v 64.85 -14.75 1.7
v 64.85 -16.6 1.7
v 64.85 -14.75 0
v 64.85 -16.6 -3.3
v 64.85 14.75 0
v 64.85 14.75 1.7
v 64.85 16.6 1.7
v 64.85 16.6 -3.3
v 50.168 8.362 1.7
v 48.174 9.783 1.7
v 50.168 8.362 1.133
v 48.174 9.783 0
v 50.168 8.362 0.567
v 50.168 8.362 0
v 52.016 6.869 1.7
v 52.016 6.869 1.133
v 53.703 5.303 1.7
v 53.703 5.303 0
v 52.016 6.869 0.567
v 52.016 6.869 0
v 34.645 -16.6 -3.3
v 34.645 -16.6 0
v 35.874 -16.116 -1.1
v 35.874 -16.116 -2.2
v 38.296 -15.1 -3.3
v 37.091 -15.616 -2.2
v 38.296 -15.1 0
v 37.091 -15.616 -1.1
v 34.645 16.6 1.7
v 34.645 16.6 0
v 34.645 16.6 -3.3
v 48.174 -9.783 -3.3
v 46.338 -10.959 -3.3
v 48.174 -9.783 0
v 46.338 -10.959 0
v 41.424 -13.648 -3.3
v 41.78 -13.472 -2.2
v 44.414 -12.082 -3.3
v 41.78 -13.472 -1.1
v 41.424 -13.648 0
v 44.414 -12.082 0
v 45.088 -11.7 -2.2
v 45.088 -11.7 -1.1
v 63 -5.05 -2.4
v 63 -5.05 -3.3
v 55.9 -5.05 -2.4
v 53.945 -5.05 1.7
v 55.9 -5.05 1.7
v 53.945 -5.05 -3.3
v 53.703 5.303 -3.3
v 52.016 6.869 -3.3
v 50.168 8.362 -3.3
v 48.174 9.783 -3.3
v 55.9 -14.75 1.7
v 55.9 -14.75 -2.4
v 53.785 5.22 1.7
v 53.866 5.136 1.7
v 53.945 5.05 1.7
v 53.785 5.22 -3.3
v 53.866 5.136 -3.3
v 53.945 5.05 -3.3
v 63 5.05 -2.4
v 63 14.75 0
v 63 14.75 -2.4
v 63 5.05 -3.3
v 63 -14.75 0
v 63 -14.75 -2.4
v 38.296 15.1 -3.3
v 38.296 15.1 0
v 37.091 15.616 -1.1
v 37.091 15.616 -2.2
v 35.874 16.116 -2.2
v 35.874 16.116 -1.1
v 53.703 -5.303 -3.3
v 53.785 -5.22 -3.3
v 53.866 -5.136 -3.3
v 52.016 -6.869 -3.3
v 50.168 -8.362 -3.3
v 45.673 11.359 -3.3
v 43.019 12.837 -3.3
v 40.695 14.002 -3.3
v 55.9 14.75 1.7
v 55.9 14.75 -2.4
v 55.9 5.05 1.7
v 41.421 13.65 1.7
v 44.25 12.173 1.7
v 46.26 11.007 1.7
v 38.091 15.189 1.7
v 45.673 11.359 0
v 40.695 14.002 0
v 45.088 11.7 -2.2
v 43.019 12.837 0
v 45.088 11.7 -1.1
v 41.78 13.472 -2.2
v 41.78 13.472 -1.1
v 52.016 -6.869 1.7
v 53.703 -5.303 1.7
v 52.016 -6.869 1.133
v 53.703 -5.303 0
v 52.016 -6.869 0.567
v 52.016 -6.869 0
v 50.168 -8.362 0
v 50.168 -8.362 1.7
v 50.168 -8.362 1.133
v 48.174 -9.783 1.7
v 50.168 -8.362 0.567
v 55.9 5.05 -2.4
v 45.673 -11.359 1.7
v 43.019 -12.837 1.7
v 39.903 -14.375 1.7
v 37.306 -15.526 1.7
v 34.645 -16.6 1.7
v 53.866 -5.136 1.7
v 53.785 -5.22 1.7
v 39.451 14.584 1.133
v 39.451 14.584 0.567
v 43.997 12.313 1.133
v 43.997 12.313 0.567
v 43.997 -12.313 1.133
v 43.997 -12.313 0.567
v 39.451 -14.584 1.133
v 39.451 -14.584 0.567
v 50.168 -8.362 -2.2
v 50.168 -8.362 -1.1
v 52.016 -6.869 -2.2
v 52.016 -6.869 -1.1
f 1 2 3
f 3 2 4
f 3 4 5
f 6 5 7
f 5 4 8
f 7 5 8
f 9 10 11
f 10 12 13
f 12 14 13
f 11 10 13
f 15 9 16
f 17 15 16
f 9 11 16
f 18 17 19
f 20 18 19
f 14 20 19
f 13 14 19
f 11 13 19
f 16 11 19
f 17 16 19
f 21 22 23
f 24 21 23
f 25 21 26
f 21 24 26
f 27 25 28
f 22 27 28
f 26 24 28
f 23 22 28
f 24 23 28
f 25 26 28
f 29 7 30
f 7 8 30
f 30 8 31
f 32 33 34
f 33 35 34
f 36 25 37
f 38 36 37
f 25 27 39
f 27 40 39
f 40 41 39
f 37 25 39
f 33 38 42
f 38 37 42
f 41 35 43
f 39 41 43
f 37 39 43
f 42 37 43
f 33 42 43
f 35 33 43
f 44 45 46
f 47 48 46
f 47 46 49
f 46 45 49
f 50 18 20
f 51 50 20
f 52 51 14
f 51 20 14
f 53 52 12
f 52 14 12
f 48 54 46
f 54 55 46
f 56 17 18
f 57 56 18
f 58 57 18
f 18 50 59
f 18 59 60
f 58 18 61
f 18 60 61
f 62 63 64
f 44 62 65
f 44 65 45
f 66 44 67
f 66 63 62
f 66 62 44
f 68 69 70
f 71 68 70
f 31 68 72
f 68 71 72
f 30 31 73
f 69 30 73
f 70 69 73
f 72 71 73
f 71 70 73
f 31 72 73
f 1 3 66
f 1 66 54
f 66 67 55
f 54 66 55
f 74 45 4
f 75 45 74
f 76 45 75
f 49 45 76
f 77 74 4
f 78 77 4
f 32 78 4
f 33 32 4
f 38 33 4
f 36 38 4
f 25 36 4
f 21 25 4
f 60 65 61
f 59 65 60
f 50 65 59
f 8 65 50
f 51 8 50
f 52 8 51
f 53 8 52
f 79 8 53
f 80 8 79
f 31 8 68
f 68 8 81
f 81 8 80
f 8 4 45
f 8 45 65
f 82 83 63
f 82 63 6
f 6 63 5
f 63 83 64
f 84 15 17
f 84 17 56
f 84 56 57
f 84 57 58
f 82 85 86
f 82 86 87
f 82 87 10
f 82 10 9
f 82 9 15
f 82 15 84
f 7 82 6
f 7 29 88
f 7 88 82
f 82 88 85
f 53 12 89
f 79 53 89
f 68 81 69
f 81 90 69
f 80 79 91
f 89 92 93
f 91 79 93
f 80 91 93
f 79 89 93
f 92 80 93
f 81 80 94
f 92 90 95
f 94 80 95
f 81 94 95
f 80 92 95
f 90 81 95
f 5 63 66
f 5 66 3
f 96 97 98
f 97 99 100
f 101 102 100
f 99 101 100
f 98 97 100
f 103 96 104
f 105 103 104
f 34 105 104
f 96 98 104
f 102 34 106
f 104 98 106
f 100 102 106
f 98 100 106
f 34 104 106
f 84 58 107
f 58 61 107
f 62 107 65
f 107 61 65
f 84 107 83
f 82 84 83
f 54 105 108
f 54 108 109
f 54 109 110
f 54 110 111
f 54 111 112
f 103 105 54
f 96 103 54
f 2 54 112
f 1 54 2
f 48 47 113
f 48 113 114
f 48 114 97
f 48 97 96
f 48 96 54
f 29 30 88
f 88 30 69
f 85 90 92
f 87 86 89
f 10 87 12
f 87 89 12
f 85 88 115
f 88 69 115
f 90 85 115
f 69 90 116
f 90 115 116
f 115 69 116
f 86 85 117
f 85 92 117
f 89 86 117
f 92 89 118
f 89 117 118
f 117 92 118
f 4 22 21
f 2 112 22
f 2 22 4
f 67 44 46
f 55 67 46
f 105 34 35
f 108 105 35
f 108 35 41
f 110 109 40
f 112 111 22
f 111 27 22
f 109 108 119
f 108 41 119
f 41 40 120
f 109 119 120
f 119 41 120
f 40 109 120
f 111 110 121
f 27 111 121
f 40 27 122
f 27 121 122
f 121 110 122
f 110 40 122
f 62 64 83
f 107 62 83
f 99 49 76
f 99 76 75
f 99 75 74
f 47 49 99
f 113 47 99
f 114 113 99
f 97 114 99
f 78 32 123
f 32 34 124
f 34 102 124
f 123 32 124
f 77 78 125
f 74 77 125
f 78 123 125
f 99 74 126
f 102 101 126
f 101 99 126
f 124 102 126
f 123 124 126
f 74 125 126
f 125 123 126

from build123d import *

# Parameters (mm, degrees)
BOSS_EXTRUDE1_DEPTH = 3.3
SKETCH2_W           = 7.1
SKETCH2_H           = 9.7
BOSS_EXTRUDE2_DEPTH = 0.9
BOSS_EXTRUDE3_DEPTH = 1.7


with BuildPart() as part:
    # Sketch1 → Boss-Extrude1 (new body)
    with BuildSketch(Plane.XY):
        with BuildLine():
            Line((57.315911484, 16.6), (34.644864201, 16.6))
            add(Edge.make_bspline(
                [(38.29556789, 15.1), (37.098221073, 15.62404419), (35.878697194, 16.123957864), (34.644864201, 16.6)],
                knots=[0.303308677, 0.303308677, 0.303308677, 0.303308677, 0.363483136, 0.363483136, 0.363483136, 0.363483136], degree=3))
            Line((38.29556789, 15.1), (58.028235271, 15.1))
            add(Edge.make_bspline(
                [(58.028235271, 15.1), (57.812878468, 15.594922403), (57.575647456, 16.094915482), (57.315911484, 16.6)],
                knots=[1.426893222, 1.426893222, 1.426893222, 1.426893222, 1.452839647, 1.452839647, 1.452839647, 1.452839647], degree=3))
        make_face()
        with BuildLine():
            Line((64.85, 16.6), (57.315911484, 16.6))
            add(Edge.make_bspline(
                [(58.028235271, 15.1), (57.812878468, 15.594922403), (57.575647456, 16.094915482), (57.315911484, 16.6)],
                knots=[1.426893222, 1.426893222, 1.426893222, 1.426893222, 1.452839647, 1.452839647, 1.452839647, 1.452839647], degree=3))
            Line((58.028235271, 15.1), (63.35, 15.1))
            Line((63.35, 15.1), (63.35, 7.210091206))
            add(Edge.make_bspline(
                [(63.35, 7.210091206), (63.846734552, 7.128818212), (64.346729159, 7.047274139), (64.85, 6.965459519)],
                knots=[2.014857734, 2.014857734, 2.014857734, 2.014857734, 2.022509587, 2.022509587, 2.022509587, 2.022509587], degree=3))
            Line((64.85, 6.965459519), (64.85, 16.6))
        make_face()
        with BuildLine():
            add(Edge.make_bspline(
                [(55.9, -8.449641541), (53.219410431, -8.903431774), (50.645090889, -9.348060462), (48.173910637, -9.783424554)],
                knots=[-0.975271105, -0.975271105, -0.975271105, -0.975271105, -0.931011535, -0.931011535, -0.931011535, -0.931011535], degree=3))
            add(Edge.make_bspline(
                [(48.17391063, -9.783424538), (50.235379211, -8.397456689), (52.10175446, -6.904847258), (53.703300859, -5.303300859)],
                knots=[0.875469321, 0.875469321, 0.875469321, 0.875469321, 1, 1, 1, 1], degree=3))
            add(Edge.make_bspline(
                [(38.29556789, -15.1), (44.330780941, -12.458561206), (49.802551874, -9.204049844), (53.703300859, -5.303300859)],
                knots=[0.696691323, 0.696691323, 0.696691323, 0.696691323, 1, 1, 1, 1], degree=3))
            Line((38.29556789, -15.1), (58.028235271, -15.1))
            add(Edge.make_bspline(
                [(58.028235271, -15.1), (58.079123886, -14.983050292), (58.128791104, -14.866383717), (58.177245249, -14.75)],
                knots=[-0.426893222, -0.426893222, -0.426893222, -0.426893222, -0.420762106, -0.420762106, -0.420762106, -0.420762106], degree=3))
            Line((58.177245249, -14.75), (55.9, -14.75))
            Line((55.9, -14.75), (55.9, -8.449641541))
        make_face()
        with BuildLine():
            add(Edge.make_bspline(
                [(48.17391063, -9.783424538), (50.235379211, -8.397456689), (52.10175446, -6.904847258), (53.703300859, -5.303300859)],
                knots=[0.875469321, 0.875469321, 0.875469321, 0.875469321, 1, 1, 1, 1], degree=3))
            add(Edge.make_bspline(
                [(55.9, -8.449641541), (53.219410431, -8.903431774), (50.645090889, -9.348060462), (48.173910637, -9.783424554)],
                knots=[-0.975271105, -0.975271105, -0.975271105, -0.975271105, -0.931011535, -0.931011535, -0.931011535, -0.931011535], degree=3))
            Line((55.9, -8.449641541), (55.9, -5.05))
            Line((55.9, -5.05), (53.953496898, -5.05))
            add(Edge.make_bspline(
                [(53.703300859, -5.303300859), (53.787433741, -5.219167977), (53.87083579, -5.134734468), (53.953496898, -5.05)],
                knots=[1, 1, 1, 1, 1.00654188, 1.00654188, 1.00654188, 1.00654188], degree=3))
        make_face()
        with BuildLine():
            add(Edge.make_bspline(
                [(53.703300859, 5.303300859), (52.10175446, 6.904847258), (50.235379211, 8.397456689), (48.17391063, 9.783424538)],
                knots=[0, 0, 0, 0, 0.124530679, 0.124530679, 0.124530679, 0.124530679], degree=3))
            add(Edge.make_bspline(
                [(53.953496898, 5.05), (53.87083579, 5.134734468), (53.787433741, 5.219167977), (53.703300859, 5.303300859)],
                knots=[-0.00654188, -0.00654188, -0.00654188, -0.00654188, 0, 0, 0, 0], degree=3))
            Line((53.953496898, 5.05), (55.9, 5.05))
            Line((55.9, 5.05), (55.9, 8.449641541))
            add(Edge.make_bspline(
                [(48.173910637, 9.783424554), (50.645090889, 9.348060462), (53.219410431, 8.903431774), (55.9, 8.449641541)],
                knots=[1.931011535, 1.931011535, 1.931011535, 1.931011535, 1.975271105, 1.975271105, 1.975271105, 1.975271105], degree=3))
        make_face()
        with BuildLine():
            add(Edge.make_bspline(
                [(53.953496898, 5.05), (53.87083579, 5.134734468), (53.787433741, 5.219167977), (53.703300859, 5.303300859)],
                knots=[-0.00654188, -0.00654188, -0.00654188, -0.00654188, 0, 0, 0, 0], degree=3))
            ThreePointArc((53.703300859, 5.303300859), (53.825650241, 5.178061362), (53.945042831, 5.05))
            Line((53.945042831, 5.05), (53.953496898, 5.05))
        make_face()
        with BuildLine():
            Line((58.028235271, 15.1), (38.29556789, 15.1))
            add(Edge.make_bspline(
                [(48.17391063, 9.783424538), (45.214437276, 11.773139517), (41.852878937, 13.543067491), (38.29556789, 15.1)],
                knots=[0.124530679, 0.124530679, 0.124530679, 0.124530679, 0.303308677, 0.303308677, 0.303308677, 0.303308677], degree=3))
            add(Edge.make_bspline(
                [(48.173910637, 9.783424554), (50.645090889, 9.348060462), (53.219410431, 8.903431774), (55.9, 8.449641541)],
                knots=[1.931011535, 1.931011535, 1.931011535, 1.931011535, 1.975271105, 1.975271105, 1.975271105, 1.975271105], degree=3))
            Line((55.9, 8.449641541), (55.9, 14.75))
            Line((55.9, 14.75), (58.177245249, 14.75))
            add(Edge.make_bspline(
                [(58.177245249, 14.75), (58.128791104, 14.866383717), (58.079123886, 14.983050292), (58.028235271, 15.1)],
                knots=[1.420762106, 1.420762106, 1.420762106, 1.420762106, 1.426893222, 1.426893222, 1.426893222, 1.426893222], degree=3))
        make_face()
        with BuildLine():
            Line((63.35, 15.1), (58.028235271, 15.1))
            add(Edge.make_bspline(
                [(58.177245249, 14.75), (58.128791104, 14.866383717), (58.079123886, 14.983050292), (58.028235271, 15.1)],
                knots=[1.420762106, 1.420762106, 1.420762106, 1.420762106, 1.426893222, 1.426893222, 1.426893222, 1.426893222], degree=3))
            Line((58.177245249, 14.75), (63, 14.75))
            Line((63, 14.75), (63, 7.267399796))
            add(Edge.make_bspline(
                [(63, 7.267399796), (63.116486418, 7.248311937), (63.233153014, 7.229209071), (63.35, 7.210091206)],
                knots=[2.013057787, 2.013057787, 2.013057787, 2.013057787, 2.014857734, 2.014857734, 2.014857734, 2.014857734], degree=3))
            Line((63.35, 7.210091206), (63.35, 15.1))
        make_face()
        with BuildLine():
            add(Edge.make_bspline(
                [(34.644864201, -16.6), (35.878697194, -16.123957864), (37.098221074, -15.62404419), (38.29556789, -15.1)],
                knots=[0.636516864, 0.636516864, 0.636516864, 0.636516864, 0.696691323, 0.696691323, 0.696691323, 0.696691323], degree=3))
            Line((34.644864201, -16.6), (57.315911484, -16.6))
            add(Edge.make_bspline(
                [(57.315911484, -16.6), (57.575647456, -16.094915482), (57.812878468, -15.594922403), (58.028235271, -15.1)],
                knots=[-0.452839647, -0.452839647, -0.452839647, -0.452839647, -0.426893222, -0.426893222, -0.426893222, -0.426893222], degree=3))
            Line((58.028235271, -15.1), (38.29556789, -15.1))
        make_face()
        with BuildLine():
            Line((64.85, -6.965459519), (64.85, 6.965459519))
            add(Edge.make_bspline(
                [(63.35, 7.210091206), (63.846734552, 7.128818212), (64.346729159, 7.047274139), (64.85, 6.965459519)],
                knots=[2.014857734, 2.014857734, 2.014857734, 2.014857734, 2.022509587, 2.022509587, 2.022509587, 2.022509587], degree=3))
            Line((63.35, 7.210091206), (63.35, -7.210091206))
            add(Edge.make_bspline(
                [(64.85, -6.965459519), (64.346729159, -7.047274139), (63.846734552, -7.128818212), (63.35, -7.210091206)],
                knots=[-1.022509587, -1.022509587, -1.022509587, -1.022509587, -1.014857734, -1.014857734, -1.014857734, -1.014857734], degree=3))
        make_face()
        with BuildLine():
            add(Edge.make_bspline(
                [(57.315911484, -16.6), (57.575647456, -16.094915482), (57.812878468, -15.594922403), (58.028235271, -15.1)],
                knots=[-0.452839647, -0.452839647, -0.452839647, -0.452839647, -0.426893222, -0.426893222, -0.426893222, -0.426893222], degree=3))
            Line((57.315911484, -16.6), (64.85, -16.6))
            Line((64.85, -16.6), (64.85, -6.965459519))
            add(Edge.make_bspline(
                [(64.85, -6.965459519), (64.346729159, -7.047274139), (63.846734552, -7.128818212), (63.35, -7.210091206)],
                knots=[-1.022509587, -1.022509587, -1.022509587, -1.022509587, -1.014857734, -1.014857734, -1.014857734, -1.014857734], degree=3))
            Line((63.35, -7.210091206), (63.35, -15.1))
            Line((63.35, -15.1), (58.028235271, -15.1))
        make_face()
        with BuildLine():
            Line((63.35, -7.210091206), (63.35, 7.210091206))
            add(Edge.make_bspline(
                [(63, 7.267399796), (63.116486418, 7.248311937), (63.233153014, 7.229209071), (63.35, 7.210091206)],
                knots=[2.013057787, 2.013057787, 2.013057787, 2.013057787, 2.014857734, 2.014857734, 2.014857734, 2.014857734], degree=3))
            Line((63, 7.267399796), (63, -7.267399796))
            add(Edge.make_bspline(
                [(63.35, -7.210091206), (63.233153014, -7.229209071), (63.116486418, -7.248311937), (63, -7.267399796)],
                knots=[-1.014857734, -1.014857734, -1.014857734, -1.014857734, -1.013057787, -1.013057787, -1.013057787, -1.013057787], degree=3))
        make_face()
        with BuildLine():
            Line((53.953496898, -5.05), (53.945042831, -5.05))
            ThreePointArc((53.945042831, -5.05), (53.825650241, -5.178061362), (53.703300859, -5.303300859))
            add(Edge.make_bspline(
                [(53.703300859, -5.303300859), (53.787433741, -5.219167977), (53.87083579, -5.134734468), (53.953496898, -5.05)],
                knots=[1, 1, 1, 1, 1.00654188, 1.00654188, 1.00654188, 1.00654188], degree=3))
        make_face()
        with BuildLine():
            add(Edge.make_bspline(
                [(58.028235271, -15.1), (58.079123886, -14.983050292), (58.128791104, -14.866383717), (58.177245249, -14.75)],
                knots=[-0.426893222, -0.426893222, -0.426893222, -0.426893222, -0.420762106, -0.420762106, -0.420762106, -0.420762106], degree=3))
            Line((58.028235271, -15.1), (63.35, -15.1))
            Line((63.35, -15.1), (63.35, -7.210091206))
            add(Edge.make_bspline(
                [(63.35, -7.210091206), (63.233153014, -7.229209071), (63.116486418, -7.248311937), (63, -7.267399796)],
                knots=[-1.014857734, -1.014857734, -1.014857734, -1.014857734, -1.013057787, -1.013057787, -1.013057787, -1.013057787], degree=3))
            Line((63, -7.267399796), (63, -14.75))
            Line((63, -14.75), (58.177245249, -14.75))
        make_face()
    extrude(amount=-BOSS_EXTRUDE1_DEPTH)

    # Sketch2 → Boss-Extrude2 (add)
    with BuildSketch(Plane(origin=(0, 0, -3.3), x_dir=(-1, 0, 0), z_dir=(0, 0, -1))):
        with Locations((-59.45, -9.9)):
            Rectangle(SKETCH2_W, SKETCH2_H)
        with Locations((-59.45, 9.9)):
            Rectangle(SKETCH2_W, SKETCH2_H)
    extrude(amount=-BOSS_EXTRUDE2_DEPTH)

    # Sketch3 → Boss-Extrude3 (add)
    with BuildSketch(Plane.XY):
        with BuildLine():
            Line((58.177245249, 14.75), (63, 14.75))
            Line((63, 14.75), (64.85, 14.75))
            Line((64.85, 14.75), (64.85, 16.6))
            Line((64.85, 16.6), (57.315911484, 16.6))
            add(Edge.make_bspline(
                [(57.315911484, 16.6), (57.637022826, 15.975564476), (57.923736792, 15.358910886), (58.177245249, 14.75)],
                knots=[0.183677217, 0.183677217, 0.183677217, 0.183677217, 0.215754758, 0.215754758, 0.215754758, 0.215754758], degree=3))
        make_face()
        with BuildLine():
            Line((57.315911484, 16.6), (34.644864201, 16.6))
            add(Edge.make_bspline(
                [(34.644864201, 16.6), (39.544408477, 14.709639199), (44.218315219, 12.442852923), (48.173910631, 9.783424537)],
                knots=[0, 0, 0, 0, 0.238952457, 0.238952457, 0.238952457, 0.238952457], degree=3))
            add(Edge.make_bspline(
                [(55.9, 8.449641541), (53.219410431, 8.903431774), (50.64509089, 9.348060461), (48.173910638, 9.783424554)],
                knots=[-1.611787969, -1.611787969, -1.611787969, -1.611787969, -1.567528399, -1.567528399, -1.567528399, -1.567528399], degree=3))
            Line((55.9, 8.449641541), (55.9, 14.75))
            Line((55.9, 14.75), (58.177245249, 14.75))
            add(Edge.make_bspline(
                [(57.315911484, 16.6), (57.637022826, 15.975564476), (57.923736792, 15.358910886), (58.177245249, 14.75)],
                knots=[0.183677217, 0.183677217, 0.183677217, 0.183677217, 0.215754758, 0.215754758, 0.215754758, 0.215754758], degree=3))
        make_face()
        with BuildLine():
            Line((55.9, 5.05), (55.9, 8.449641541))
            add(Edge.make_bspline(
                [(55.9, 8.449641541), (53.219410431, 8.903431774), (50.64509089, 9.348060461), (48.173910638, 9.783424554)],
                knots=[-1.611787969, -1.611787969, -1.611787969, -1.611787969, -1.567528399, -1.567528399, -1.567528399, -1.567528399], degree=3))
            add(Edge.make_bspline(
                [(48.173910631, 9.783424537), (50.235379212, 8.397456689), (52.10175446, 6.904847257), (53.703300859, 5.303300859)],
                knots=[0.238952457, 0.238952457, 0.238952457, 0.238952457, 0.363483136, 0.363483136, 0.363483136, 0.363483136], degree=3))
            add(Edge.make_bspline(
                [(53.703300859, 5.303300859), (53.787433741, 5.219167977), (53.87083579, 5.134734468), (53.953496898, 5.05)],
                knots=[0.363483136, 0.363483136, 0.363483136, 0.363483136, 0.370025016, 0.370025016, 0.370025016, 0.370025016], degree=3))
            Line((53.953496898, 5.05), (55.9, 5.05))
        make_face()
        with BuildLine():
            Line((64.85, -14.75), (63, -14.75))
            Line((63, -14.75), (58.177245249, -14.75))
            add(Edge.make_bspline(
                [(58.177245249, -14.75), (57.923736792, -15.358910886), (57.637022826, -15.975564476), (57.315911484, -16.6)],
                knots=[0.784245242, 0.784245242, 0.784245242, 0.784245242, 0.816322783, 0.816322783, 0.816322783, 0.816322783], degree=3))
            Line((57.315911484, -16.6), (64.85, -16.6))
            Line((64.85, -16.6), (64.85, -14.75))
        make_face()
        with BuildLine():
            add(Edge.make_bspline(
                [(53.703300859, 5.303300859), (53.787433741, 5.219167977), (53.87083579, 5.134734468), (53.953496898, 5.05)],
                knots=[0.363483136, 0.363483136, 0.363483136, 0.363483136, 0.370025016, 0.370025016, 0.370025016, 0.370025016], degree=3))
            ThreePointArc((53.703300859, 5.303300859), (53.825650241, 5.178061362), (53.945042831, 5.05))
            Line((53.945042831, 5.05), (53.953496898, 5.05))
        make_face()
        with BuildLine():
            add(Edge.make_bspline(
                [(53.953496898, -5.05), (53.87083579, -5.134734468), (53.787433741, -5.219167977), (53.703300859, -5.303300859)],
                knots=[0.629974984, 0.629974984, 0.629974984, 0.629974984, 0.636516864, 0.636516864, 0.636516864, 0.636516864], degree=3))
            Line((53.953496898, -5.05), (53.945042831, -5.05))
            ThreePointArc((53.945042831, -5.05), (53.825650241, -5.178061362), (53.703300859, -5.303300859))
        make_face()
        with BuildLine():
            add(Edge.make_bspline(
                [(48.173910631, -9.783424537), (44.218315219, -12.442852923), (39.544408477, -14.709639199), (34.644864201, -16.6)],
                knots=[0.761047543, 0.761047543, 0.761047543, 0.761047543, 1, 1, 1, 1], degree=3))
            Line((34.644864201, -16.6), (57.315911484, -16.6))
            add(Edge.make_bspline(
                [(58.177245249, -14.75), (57.923736792, -15.358910886), (57.637022826, -15.975564476), (57.315911484, -16.6)],
                knots=[0.784245242, 0.784245242, 0.784245242, 0.784245242, 0.816322783, 0.816322783, 0.816322783, 0.816322783], degree=3))
            Line((58.177245249, -14.75), (55.9, -14.75))
            Line((55.9, -14.75), (55.9, -8.449641541))
            add(Edge.make_bspline(
                [(48.173910638, -9.783424554), (50.64509089, -9.348060461), (53.219410431, -8.903431774), (55.9, -8.449641541)],
                knots=[2.567528399, 2.567528399, 2.567528399, 2.567528399, 2.611787969, 2.611787969, 2.611787969, 2.611787969], degree=3))
        make_face()
        with BuildLine():
            Line((55.9, -5.05), (53.953496898, -5.05))
            add(Edge.make_bspline(
                [(53.953496898, -5.05), (53.87083579, -5.134734468), (53.787433741, -5.219167977), (53.703300859, -5.303300859)],
                knots=[0.629974984, 0.629974984, 0.629974984, 0.629974984, 0.636516864, 0.636516864, 0.636516864, 0.636516864], degree=3))
            add(Edge.make_bspline(
                [(53.703300859, -5.303300859), (52.10175446, -6.904847257), (50.235379212, -8.397456689), (48.173910631, -9.783424537)],
                knots=[0.636516864, 0.636516864, 0.636516864, 0.636516864, 0.761047543, 0.761047543, 0.761047543, 0.761047543], degree=3))
            add(Edge.make_bspline(
                [(48.173910638, -9.783424554), (50.64509089, -9.348060461), (53.219410431, -8.903431774), (55.9, -8.449641541)],
                knots=[2.567528399, 2.567528399, 2.567528399, 2.567528399, 2.611787969, 2.611787969, 2.611787969, 2.611787969], degree=3))
            Line((55.9, -8.449641541), (55.9, -5.05))
        make_face()
    extrude(amount=BOSS_EXTRUDE3_DEPTH)


solid = part.part
